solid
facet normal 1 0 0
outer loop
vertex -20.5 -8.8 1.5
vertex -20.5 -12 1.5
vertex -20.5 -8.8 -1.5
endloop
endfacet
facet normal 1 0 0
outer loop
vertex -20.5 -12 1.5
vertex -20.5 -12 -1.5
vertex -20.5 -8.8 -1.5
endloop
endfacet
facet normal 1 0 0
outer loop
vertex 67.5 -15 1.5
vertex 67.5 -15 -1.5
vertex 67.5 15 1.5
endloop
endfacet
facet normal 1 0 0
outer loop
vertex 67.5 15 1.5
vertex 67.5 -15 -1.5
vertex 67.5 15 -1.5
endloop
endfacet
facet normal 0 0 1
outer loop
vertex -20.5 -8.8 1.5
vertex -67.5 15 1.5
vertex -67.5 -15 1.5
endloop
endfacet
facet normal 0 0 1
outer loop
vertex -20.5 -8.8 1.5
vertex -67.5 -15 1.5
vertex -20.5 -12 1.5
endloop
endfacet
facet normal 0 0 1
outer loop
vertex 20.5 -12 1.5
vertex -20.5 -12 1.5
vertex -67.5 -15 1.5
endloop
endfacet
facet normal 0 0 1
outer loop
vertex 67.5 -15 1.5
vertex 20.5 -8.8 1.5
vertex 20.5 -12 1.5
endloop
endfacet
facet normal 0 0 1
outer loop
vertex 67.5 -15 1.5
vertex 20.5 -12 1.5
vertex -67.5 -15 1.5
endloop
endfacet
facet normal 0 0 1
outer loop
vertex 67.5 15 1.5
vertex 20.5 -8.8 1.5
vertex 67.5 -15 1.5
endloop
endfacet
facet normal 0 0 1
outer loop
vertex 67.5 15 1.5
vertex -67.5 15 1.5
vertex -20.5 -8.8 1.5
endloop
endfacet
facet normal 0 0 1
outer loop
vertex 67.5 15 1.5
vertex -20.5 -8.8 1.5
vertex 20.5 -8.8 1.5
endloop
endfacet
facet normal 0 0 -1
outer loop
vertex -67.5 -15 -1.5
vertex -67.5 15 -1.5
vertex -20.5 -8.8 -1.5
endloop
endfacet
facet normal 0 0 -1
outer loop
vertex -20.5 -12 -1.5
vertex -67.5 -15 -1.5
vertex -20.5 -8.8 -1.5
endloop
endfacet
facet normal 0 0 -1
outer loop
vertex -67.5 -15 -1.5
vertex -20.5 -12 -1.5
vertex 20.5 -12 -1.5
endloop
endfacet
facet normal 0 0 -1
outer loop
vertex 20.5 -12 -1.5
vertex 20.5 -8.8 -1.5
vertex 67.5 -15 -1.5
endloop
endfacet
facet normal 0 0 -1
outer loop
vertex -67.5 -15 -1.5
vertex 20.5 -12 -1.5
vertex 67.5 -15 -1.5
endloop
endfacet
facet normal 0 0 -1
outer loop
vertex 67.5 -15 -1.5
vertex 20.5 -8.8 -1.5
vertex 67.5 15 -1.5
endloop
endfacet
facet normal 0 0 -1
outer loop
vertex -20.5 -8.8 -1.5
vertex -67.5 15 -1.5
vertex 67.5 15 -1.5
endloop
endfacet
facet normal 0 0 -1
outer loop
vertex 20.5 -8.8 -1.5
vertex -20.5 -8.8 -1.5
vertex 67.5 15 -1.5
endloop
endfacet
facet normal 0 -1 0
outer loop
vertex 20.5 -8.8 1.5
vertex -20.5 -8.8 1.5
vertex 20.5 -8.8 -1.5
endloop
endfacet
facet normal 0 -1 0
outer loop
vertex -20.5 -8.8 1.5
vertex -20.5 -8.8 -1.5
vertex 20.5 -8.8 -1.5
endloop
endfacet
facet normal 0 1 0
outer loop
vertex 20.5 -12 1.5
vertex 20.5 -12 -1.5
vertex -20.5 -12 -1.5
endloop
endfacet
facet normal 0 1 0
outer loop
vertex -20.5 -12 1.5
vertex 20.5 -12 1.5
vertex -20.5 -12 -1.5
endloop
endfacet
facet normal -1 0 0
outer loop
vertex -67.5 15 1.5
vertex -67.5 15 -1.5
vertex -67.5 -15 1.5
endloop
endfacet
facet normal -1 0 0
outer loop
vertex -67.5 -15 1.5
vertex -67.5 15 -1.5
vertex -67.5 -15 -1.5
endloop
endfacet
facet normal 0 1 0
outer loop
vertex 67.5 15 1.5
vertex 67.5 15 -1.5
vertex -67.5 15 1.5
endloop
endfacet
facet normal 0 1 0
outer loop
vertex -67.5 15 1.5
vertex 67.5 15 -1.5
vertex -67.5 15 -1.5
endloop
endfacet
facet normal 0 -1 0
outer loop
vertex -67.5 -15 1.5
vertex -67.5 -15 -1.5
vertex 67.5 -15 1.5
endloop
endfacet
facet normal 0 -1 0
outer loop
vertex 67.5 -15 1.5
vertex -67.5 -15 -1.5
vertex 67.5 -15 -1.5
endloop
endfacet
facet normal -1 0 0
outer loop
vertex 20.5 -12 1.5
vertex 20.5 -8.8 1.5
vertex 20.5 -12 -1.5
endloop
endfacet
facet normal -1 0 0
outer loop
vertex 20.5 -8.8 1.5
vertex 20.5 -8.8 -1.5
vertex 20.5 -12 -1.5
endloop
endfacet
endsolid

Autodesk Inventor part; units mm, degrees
ref_plane "YZ Plane" through (0, 0, 0) normal (1, 0, 0) x (0, 1, 0)
ref_plane "XZ Plane" through (0, 0, 0) normal (0, 1, 0) x (-1, 0, 0)
ref_plane "XY Plane" through (0, 0, 0) normal (0, 0, 1) x (1, 0, 0)
sketch "Sketch1" plane through (0, 0, 0) normal (0, 0, 1) x (1, 0, 0)
  line L0 (-67.5, -15) -> (67.5, -15)
  line L1 (67.5, -15) -> (67.5, 15)
  line L2 (67.5, 15) -> (-67.5, 15)
  line L3 (-67.5, 15) -> (-67.5, -15)
  line L4 (-67.5, -15) -> (67.5, 15) construction
  line L5 (67.5, -15) -> (-67.5, 15) construction
  line L6 (-20.5, -8.8) -> (20.5, -8.8)
  line L7 (20.5, -8.8) -> (20.5, -12)
  line L8 (20.5, -12) -> (-20.5, -12)
  line L9 (-20.5, -12) -> (-20.5, -8.8)
  line L10 (-20.5, -8.8) -> (20.5, -12) construction
  line L11 (20.5, -8.8) -> (-20.5, -12) construction
  point P0 (0, 0)
  point P1 (0, -10.4)
  point P2 (0, -8.8)
  dimension "d0" = 135
  dimension "d1" = 30
  dimension "d5" = 41
  dimension "d6" = 3
  dimension "d7" = 3.2
extrude "Plate1" add sketch "Sketch1" along normal mid plane 3
equation "\"d4\" = Thickness"
equation "\"BendRadius\" = Thickness"
equation "\"BendReliefWidth\" = Thickness"
equation "\"BendReliefDepth\" = 0.5 * Thickness"
equation "\"CornerReliefSize\" = 4 * Thickness"
equation "\"MinimumRemnant\" = 2 * Thickness"
equation "\"TransitionRadius\" = BendRadius"
equation "\"JacobiRadiusSize\" = BendRadius"
equation "\"GapSize\" = Thickness"
equation "\"Thickness\" = 3"
properties part number "Path Side Wall"
